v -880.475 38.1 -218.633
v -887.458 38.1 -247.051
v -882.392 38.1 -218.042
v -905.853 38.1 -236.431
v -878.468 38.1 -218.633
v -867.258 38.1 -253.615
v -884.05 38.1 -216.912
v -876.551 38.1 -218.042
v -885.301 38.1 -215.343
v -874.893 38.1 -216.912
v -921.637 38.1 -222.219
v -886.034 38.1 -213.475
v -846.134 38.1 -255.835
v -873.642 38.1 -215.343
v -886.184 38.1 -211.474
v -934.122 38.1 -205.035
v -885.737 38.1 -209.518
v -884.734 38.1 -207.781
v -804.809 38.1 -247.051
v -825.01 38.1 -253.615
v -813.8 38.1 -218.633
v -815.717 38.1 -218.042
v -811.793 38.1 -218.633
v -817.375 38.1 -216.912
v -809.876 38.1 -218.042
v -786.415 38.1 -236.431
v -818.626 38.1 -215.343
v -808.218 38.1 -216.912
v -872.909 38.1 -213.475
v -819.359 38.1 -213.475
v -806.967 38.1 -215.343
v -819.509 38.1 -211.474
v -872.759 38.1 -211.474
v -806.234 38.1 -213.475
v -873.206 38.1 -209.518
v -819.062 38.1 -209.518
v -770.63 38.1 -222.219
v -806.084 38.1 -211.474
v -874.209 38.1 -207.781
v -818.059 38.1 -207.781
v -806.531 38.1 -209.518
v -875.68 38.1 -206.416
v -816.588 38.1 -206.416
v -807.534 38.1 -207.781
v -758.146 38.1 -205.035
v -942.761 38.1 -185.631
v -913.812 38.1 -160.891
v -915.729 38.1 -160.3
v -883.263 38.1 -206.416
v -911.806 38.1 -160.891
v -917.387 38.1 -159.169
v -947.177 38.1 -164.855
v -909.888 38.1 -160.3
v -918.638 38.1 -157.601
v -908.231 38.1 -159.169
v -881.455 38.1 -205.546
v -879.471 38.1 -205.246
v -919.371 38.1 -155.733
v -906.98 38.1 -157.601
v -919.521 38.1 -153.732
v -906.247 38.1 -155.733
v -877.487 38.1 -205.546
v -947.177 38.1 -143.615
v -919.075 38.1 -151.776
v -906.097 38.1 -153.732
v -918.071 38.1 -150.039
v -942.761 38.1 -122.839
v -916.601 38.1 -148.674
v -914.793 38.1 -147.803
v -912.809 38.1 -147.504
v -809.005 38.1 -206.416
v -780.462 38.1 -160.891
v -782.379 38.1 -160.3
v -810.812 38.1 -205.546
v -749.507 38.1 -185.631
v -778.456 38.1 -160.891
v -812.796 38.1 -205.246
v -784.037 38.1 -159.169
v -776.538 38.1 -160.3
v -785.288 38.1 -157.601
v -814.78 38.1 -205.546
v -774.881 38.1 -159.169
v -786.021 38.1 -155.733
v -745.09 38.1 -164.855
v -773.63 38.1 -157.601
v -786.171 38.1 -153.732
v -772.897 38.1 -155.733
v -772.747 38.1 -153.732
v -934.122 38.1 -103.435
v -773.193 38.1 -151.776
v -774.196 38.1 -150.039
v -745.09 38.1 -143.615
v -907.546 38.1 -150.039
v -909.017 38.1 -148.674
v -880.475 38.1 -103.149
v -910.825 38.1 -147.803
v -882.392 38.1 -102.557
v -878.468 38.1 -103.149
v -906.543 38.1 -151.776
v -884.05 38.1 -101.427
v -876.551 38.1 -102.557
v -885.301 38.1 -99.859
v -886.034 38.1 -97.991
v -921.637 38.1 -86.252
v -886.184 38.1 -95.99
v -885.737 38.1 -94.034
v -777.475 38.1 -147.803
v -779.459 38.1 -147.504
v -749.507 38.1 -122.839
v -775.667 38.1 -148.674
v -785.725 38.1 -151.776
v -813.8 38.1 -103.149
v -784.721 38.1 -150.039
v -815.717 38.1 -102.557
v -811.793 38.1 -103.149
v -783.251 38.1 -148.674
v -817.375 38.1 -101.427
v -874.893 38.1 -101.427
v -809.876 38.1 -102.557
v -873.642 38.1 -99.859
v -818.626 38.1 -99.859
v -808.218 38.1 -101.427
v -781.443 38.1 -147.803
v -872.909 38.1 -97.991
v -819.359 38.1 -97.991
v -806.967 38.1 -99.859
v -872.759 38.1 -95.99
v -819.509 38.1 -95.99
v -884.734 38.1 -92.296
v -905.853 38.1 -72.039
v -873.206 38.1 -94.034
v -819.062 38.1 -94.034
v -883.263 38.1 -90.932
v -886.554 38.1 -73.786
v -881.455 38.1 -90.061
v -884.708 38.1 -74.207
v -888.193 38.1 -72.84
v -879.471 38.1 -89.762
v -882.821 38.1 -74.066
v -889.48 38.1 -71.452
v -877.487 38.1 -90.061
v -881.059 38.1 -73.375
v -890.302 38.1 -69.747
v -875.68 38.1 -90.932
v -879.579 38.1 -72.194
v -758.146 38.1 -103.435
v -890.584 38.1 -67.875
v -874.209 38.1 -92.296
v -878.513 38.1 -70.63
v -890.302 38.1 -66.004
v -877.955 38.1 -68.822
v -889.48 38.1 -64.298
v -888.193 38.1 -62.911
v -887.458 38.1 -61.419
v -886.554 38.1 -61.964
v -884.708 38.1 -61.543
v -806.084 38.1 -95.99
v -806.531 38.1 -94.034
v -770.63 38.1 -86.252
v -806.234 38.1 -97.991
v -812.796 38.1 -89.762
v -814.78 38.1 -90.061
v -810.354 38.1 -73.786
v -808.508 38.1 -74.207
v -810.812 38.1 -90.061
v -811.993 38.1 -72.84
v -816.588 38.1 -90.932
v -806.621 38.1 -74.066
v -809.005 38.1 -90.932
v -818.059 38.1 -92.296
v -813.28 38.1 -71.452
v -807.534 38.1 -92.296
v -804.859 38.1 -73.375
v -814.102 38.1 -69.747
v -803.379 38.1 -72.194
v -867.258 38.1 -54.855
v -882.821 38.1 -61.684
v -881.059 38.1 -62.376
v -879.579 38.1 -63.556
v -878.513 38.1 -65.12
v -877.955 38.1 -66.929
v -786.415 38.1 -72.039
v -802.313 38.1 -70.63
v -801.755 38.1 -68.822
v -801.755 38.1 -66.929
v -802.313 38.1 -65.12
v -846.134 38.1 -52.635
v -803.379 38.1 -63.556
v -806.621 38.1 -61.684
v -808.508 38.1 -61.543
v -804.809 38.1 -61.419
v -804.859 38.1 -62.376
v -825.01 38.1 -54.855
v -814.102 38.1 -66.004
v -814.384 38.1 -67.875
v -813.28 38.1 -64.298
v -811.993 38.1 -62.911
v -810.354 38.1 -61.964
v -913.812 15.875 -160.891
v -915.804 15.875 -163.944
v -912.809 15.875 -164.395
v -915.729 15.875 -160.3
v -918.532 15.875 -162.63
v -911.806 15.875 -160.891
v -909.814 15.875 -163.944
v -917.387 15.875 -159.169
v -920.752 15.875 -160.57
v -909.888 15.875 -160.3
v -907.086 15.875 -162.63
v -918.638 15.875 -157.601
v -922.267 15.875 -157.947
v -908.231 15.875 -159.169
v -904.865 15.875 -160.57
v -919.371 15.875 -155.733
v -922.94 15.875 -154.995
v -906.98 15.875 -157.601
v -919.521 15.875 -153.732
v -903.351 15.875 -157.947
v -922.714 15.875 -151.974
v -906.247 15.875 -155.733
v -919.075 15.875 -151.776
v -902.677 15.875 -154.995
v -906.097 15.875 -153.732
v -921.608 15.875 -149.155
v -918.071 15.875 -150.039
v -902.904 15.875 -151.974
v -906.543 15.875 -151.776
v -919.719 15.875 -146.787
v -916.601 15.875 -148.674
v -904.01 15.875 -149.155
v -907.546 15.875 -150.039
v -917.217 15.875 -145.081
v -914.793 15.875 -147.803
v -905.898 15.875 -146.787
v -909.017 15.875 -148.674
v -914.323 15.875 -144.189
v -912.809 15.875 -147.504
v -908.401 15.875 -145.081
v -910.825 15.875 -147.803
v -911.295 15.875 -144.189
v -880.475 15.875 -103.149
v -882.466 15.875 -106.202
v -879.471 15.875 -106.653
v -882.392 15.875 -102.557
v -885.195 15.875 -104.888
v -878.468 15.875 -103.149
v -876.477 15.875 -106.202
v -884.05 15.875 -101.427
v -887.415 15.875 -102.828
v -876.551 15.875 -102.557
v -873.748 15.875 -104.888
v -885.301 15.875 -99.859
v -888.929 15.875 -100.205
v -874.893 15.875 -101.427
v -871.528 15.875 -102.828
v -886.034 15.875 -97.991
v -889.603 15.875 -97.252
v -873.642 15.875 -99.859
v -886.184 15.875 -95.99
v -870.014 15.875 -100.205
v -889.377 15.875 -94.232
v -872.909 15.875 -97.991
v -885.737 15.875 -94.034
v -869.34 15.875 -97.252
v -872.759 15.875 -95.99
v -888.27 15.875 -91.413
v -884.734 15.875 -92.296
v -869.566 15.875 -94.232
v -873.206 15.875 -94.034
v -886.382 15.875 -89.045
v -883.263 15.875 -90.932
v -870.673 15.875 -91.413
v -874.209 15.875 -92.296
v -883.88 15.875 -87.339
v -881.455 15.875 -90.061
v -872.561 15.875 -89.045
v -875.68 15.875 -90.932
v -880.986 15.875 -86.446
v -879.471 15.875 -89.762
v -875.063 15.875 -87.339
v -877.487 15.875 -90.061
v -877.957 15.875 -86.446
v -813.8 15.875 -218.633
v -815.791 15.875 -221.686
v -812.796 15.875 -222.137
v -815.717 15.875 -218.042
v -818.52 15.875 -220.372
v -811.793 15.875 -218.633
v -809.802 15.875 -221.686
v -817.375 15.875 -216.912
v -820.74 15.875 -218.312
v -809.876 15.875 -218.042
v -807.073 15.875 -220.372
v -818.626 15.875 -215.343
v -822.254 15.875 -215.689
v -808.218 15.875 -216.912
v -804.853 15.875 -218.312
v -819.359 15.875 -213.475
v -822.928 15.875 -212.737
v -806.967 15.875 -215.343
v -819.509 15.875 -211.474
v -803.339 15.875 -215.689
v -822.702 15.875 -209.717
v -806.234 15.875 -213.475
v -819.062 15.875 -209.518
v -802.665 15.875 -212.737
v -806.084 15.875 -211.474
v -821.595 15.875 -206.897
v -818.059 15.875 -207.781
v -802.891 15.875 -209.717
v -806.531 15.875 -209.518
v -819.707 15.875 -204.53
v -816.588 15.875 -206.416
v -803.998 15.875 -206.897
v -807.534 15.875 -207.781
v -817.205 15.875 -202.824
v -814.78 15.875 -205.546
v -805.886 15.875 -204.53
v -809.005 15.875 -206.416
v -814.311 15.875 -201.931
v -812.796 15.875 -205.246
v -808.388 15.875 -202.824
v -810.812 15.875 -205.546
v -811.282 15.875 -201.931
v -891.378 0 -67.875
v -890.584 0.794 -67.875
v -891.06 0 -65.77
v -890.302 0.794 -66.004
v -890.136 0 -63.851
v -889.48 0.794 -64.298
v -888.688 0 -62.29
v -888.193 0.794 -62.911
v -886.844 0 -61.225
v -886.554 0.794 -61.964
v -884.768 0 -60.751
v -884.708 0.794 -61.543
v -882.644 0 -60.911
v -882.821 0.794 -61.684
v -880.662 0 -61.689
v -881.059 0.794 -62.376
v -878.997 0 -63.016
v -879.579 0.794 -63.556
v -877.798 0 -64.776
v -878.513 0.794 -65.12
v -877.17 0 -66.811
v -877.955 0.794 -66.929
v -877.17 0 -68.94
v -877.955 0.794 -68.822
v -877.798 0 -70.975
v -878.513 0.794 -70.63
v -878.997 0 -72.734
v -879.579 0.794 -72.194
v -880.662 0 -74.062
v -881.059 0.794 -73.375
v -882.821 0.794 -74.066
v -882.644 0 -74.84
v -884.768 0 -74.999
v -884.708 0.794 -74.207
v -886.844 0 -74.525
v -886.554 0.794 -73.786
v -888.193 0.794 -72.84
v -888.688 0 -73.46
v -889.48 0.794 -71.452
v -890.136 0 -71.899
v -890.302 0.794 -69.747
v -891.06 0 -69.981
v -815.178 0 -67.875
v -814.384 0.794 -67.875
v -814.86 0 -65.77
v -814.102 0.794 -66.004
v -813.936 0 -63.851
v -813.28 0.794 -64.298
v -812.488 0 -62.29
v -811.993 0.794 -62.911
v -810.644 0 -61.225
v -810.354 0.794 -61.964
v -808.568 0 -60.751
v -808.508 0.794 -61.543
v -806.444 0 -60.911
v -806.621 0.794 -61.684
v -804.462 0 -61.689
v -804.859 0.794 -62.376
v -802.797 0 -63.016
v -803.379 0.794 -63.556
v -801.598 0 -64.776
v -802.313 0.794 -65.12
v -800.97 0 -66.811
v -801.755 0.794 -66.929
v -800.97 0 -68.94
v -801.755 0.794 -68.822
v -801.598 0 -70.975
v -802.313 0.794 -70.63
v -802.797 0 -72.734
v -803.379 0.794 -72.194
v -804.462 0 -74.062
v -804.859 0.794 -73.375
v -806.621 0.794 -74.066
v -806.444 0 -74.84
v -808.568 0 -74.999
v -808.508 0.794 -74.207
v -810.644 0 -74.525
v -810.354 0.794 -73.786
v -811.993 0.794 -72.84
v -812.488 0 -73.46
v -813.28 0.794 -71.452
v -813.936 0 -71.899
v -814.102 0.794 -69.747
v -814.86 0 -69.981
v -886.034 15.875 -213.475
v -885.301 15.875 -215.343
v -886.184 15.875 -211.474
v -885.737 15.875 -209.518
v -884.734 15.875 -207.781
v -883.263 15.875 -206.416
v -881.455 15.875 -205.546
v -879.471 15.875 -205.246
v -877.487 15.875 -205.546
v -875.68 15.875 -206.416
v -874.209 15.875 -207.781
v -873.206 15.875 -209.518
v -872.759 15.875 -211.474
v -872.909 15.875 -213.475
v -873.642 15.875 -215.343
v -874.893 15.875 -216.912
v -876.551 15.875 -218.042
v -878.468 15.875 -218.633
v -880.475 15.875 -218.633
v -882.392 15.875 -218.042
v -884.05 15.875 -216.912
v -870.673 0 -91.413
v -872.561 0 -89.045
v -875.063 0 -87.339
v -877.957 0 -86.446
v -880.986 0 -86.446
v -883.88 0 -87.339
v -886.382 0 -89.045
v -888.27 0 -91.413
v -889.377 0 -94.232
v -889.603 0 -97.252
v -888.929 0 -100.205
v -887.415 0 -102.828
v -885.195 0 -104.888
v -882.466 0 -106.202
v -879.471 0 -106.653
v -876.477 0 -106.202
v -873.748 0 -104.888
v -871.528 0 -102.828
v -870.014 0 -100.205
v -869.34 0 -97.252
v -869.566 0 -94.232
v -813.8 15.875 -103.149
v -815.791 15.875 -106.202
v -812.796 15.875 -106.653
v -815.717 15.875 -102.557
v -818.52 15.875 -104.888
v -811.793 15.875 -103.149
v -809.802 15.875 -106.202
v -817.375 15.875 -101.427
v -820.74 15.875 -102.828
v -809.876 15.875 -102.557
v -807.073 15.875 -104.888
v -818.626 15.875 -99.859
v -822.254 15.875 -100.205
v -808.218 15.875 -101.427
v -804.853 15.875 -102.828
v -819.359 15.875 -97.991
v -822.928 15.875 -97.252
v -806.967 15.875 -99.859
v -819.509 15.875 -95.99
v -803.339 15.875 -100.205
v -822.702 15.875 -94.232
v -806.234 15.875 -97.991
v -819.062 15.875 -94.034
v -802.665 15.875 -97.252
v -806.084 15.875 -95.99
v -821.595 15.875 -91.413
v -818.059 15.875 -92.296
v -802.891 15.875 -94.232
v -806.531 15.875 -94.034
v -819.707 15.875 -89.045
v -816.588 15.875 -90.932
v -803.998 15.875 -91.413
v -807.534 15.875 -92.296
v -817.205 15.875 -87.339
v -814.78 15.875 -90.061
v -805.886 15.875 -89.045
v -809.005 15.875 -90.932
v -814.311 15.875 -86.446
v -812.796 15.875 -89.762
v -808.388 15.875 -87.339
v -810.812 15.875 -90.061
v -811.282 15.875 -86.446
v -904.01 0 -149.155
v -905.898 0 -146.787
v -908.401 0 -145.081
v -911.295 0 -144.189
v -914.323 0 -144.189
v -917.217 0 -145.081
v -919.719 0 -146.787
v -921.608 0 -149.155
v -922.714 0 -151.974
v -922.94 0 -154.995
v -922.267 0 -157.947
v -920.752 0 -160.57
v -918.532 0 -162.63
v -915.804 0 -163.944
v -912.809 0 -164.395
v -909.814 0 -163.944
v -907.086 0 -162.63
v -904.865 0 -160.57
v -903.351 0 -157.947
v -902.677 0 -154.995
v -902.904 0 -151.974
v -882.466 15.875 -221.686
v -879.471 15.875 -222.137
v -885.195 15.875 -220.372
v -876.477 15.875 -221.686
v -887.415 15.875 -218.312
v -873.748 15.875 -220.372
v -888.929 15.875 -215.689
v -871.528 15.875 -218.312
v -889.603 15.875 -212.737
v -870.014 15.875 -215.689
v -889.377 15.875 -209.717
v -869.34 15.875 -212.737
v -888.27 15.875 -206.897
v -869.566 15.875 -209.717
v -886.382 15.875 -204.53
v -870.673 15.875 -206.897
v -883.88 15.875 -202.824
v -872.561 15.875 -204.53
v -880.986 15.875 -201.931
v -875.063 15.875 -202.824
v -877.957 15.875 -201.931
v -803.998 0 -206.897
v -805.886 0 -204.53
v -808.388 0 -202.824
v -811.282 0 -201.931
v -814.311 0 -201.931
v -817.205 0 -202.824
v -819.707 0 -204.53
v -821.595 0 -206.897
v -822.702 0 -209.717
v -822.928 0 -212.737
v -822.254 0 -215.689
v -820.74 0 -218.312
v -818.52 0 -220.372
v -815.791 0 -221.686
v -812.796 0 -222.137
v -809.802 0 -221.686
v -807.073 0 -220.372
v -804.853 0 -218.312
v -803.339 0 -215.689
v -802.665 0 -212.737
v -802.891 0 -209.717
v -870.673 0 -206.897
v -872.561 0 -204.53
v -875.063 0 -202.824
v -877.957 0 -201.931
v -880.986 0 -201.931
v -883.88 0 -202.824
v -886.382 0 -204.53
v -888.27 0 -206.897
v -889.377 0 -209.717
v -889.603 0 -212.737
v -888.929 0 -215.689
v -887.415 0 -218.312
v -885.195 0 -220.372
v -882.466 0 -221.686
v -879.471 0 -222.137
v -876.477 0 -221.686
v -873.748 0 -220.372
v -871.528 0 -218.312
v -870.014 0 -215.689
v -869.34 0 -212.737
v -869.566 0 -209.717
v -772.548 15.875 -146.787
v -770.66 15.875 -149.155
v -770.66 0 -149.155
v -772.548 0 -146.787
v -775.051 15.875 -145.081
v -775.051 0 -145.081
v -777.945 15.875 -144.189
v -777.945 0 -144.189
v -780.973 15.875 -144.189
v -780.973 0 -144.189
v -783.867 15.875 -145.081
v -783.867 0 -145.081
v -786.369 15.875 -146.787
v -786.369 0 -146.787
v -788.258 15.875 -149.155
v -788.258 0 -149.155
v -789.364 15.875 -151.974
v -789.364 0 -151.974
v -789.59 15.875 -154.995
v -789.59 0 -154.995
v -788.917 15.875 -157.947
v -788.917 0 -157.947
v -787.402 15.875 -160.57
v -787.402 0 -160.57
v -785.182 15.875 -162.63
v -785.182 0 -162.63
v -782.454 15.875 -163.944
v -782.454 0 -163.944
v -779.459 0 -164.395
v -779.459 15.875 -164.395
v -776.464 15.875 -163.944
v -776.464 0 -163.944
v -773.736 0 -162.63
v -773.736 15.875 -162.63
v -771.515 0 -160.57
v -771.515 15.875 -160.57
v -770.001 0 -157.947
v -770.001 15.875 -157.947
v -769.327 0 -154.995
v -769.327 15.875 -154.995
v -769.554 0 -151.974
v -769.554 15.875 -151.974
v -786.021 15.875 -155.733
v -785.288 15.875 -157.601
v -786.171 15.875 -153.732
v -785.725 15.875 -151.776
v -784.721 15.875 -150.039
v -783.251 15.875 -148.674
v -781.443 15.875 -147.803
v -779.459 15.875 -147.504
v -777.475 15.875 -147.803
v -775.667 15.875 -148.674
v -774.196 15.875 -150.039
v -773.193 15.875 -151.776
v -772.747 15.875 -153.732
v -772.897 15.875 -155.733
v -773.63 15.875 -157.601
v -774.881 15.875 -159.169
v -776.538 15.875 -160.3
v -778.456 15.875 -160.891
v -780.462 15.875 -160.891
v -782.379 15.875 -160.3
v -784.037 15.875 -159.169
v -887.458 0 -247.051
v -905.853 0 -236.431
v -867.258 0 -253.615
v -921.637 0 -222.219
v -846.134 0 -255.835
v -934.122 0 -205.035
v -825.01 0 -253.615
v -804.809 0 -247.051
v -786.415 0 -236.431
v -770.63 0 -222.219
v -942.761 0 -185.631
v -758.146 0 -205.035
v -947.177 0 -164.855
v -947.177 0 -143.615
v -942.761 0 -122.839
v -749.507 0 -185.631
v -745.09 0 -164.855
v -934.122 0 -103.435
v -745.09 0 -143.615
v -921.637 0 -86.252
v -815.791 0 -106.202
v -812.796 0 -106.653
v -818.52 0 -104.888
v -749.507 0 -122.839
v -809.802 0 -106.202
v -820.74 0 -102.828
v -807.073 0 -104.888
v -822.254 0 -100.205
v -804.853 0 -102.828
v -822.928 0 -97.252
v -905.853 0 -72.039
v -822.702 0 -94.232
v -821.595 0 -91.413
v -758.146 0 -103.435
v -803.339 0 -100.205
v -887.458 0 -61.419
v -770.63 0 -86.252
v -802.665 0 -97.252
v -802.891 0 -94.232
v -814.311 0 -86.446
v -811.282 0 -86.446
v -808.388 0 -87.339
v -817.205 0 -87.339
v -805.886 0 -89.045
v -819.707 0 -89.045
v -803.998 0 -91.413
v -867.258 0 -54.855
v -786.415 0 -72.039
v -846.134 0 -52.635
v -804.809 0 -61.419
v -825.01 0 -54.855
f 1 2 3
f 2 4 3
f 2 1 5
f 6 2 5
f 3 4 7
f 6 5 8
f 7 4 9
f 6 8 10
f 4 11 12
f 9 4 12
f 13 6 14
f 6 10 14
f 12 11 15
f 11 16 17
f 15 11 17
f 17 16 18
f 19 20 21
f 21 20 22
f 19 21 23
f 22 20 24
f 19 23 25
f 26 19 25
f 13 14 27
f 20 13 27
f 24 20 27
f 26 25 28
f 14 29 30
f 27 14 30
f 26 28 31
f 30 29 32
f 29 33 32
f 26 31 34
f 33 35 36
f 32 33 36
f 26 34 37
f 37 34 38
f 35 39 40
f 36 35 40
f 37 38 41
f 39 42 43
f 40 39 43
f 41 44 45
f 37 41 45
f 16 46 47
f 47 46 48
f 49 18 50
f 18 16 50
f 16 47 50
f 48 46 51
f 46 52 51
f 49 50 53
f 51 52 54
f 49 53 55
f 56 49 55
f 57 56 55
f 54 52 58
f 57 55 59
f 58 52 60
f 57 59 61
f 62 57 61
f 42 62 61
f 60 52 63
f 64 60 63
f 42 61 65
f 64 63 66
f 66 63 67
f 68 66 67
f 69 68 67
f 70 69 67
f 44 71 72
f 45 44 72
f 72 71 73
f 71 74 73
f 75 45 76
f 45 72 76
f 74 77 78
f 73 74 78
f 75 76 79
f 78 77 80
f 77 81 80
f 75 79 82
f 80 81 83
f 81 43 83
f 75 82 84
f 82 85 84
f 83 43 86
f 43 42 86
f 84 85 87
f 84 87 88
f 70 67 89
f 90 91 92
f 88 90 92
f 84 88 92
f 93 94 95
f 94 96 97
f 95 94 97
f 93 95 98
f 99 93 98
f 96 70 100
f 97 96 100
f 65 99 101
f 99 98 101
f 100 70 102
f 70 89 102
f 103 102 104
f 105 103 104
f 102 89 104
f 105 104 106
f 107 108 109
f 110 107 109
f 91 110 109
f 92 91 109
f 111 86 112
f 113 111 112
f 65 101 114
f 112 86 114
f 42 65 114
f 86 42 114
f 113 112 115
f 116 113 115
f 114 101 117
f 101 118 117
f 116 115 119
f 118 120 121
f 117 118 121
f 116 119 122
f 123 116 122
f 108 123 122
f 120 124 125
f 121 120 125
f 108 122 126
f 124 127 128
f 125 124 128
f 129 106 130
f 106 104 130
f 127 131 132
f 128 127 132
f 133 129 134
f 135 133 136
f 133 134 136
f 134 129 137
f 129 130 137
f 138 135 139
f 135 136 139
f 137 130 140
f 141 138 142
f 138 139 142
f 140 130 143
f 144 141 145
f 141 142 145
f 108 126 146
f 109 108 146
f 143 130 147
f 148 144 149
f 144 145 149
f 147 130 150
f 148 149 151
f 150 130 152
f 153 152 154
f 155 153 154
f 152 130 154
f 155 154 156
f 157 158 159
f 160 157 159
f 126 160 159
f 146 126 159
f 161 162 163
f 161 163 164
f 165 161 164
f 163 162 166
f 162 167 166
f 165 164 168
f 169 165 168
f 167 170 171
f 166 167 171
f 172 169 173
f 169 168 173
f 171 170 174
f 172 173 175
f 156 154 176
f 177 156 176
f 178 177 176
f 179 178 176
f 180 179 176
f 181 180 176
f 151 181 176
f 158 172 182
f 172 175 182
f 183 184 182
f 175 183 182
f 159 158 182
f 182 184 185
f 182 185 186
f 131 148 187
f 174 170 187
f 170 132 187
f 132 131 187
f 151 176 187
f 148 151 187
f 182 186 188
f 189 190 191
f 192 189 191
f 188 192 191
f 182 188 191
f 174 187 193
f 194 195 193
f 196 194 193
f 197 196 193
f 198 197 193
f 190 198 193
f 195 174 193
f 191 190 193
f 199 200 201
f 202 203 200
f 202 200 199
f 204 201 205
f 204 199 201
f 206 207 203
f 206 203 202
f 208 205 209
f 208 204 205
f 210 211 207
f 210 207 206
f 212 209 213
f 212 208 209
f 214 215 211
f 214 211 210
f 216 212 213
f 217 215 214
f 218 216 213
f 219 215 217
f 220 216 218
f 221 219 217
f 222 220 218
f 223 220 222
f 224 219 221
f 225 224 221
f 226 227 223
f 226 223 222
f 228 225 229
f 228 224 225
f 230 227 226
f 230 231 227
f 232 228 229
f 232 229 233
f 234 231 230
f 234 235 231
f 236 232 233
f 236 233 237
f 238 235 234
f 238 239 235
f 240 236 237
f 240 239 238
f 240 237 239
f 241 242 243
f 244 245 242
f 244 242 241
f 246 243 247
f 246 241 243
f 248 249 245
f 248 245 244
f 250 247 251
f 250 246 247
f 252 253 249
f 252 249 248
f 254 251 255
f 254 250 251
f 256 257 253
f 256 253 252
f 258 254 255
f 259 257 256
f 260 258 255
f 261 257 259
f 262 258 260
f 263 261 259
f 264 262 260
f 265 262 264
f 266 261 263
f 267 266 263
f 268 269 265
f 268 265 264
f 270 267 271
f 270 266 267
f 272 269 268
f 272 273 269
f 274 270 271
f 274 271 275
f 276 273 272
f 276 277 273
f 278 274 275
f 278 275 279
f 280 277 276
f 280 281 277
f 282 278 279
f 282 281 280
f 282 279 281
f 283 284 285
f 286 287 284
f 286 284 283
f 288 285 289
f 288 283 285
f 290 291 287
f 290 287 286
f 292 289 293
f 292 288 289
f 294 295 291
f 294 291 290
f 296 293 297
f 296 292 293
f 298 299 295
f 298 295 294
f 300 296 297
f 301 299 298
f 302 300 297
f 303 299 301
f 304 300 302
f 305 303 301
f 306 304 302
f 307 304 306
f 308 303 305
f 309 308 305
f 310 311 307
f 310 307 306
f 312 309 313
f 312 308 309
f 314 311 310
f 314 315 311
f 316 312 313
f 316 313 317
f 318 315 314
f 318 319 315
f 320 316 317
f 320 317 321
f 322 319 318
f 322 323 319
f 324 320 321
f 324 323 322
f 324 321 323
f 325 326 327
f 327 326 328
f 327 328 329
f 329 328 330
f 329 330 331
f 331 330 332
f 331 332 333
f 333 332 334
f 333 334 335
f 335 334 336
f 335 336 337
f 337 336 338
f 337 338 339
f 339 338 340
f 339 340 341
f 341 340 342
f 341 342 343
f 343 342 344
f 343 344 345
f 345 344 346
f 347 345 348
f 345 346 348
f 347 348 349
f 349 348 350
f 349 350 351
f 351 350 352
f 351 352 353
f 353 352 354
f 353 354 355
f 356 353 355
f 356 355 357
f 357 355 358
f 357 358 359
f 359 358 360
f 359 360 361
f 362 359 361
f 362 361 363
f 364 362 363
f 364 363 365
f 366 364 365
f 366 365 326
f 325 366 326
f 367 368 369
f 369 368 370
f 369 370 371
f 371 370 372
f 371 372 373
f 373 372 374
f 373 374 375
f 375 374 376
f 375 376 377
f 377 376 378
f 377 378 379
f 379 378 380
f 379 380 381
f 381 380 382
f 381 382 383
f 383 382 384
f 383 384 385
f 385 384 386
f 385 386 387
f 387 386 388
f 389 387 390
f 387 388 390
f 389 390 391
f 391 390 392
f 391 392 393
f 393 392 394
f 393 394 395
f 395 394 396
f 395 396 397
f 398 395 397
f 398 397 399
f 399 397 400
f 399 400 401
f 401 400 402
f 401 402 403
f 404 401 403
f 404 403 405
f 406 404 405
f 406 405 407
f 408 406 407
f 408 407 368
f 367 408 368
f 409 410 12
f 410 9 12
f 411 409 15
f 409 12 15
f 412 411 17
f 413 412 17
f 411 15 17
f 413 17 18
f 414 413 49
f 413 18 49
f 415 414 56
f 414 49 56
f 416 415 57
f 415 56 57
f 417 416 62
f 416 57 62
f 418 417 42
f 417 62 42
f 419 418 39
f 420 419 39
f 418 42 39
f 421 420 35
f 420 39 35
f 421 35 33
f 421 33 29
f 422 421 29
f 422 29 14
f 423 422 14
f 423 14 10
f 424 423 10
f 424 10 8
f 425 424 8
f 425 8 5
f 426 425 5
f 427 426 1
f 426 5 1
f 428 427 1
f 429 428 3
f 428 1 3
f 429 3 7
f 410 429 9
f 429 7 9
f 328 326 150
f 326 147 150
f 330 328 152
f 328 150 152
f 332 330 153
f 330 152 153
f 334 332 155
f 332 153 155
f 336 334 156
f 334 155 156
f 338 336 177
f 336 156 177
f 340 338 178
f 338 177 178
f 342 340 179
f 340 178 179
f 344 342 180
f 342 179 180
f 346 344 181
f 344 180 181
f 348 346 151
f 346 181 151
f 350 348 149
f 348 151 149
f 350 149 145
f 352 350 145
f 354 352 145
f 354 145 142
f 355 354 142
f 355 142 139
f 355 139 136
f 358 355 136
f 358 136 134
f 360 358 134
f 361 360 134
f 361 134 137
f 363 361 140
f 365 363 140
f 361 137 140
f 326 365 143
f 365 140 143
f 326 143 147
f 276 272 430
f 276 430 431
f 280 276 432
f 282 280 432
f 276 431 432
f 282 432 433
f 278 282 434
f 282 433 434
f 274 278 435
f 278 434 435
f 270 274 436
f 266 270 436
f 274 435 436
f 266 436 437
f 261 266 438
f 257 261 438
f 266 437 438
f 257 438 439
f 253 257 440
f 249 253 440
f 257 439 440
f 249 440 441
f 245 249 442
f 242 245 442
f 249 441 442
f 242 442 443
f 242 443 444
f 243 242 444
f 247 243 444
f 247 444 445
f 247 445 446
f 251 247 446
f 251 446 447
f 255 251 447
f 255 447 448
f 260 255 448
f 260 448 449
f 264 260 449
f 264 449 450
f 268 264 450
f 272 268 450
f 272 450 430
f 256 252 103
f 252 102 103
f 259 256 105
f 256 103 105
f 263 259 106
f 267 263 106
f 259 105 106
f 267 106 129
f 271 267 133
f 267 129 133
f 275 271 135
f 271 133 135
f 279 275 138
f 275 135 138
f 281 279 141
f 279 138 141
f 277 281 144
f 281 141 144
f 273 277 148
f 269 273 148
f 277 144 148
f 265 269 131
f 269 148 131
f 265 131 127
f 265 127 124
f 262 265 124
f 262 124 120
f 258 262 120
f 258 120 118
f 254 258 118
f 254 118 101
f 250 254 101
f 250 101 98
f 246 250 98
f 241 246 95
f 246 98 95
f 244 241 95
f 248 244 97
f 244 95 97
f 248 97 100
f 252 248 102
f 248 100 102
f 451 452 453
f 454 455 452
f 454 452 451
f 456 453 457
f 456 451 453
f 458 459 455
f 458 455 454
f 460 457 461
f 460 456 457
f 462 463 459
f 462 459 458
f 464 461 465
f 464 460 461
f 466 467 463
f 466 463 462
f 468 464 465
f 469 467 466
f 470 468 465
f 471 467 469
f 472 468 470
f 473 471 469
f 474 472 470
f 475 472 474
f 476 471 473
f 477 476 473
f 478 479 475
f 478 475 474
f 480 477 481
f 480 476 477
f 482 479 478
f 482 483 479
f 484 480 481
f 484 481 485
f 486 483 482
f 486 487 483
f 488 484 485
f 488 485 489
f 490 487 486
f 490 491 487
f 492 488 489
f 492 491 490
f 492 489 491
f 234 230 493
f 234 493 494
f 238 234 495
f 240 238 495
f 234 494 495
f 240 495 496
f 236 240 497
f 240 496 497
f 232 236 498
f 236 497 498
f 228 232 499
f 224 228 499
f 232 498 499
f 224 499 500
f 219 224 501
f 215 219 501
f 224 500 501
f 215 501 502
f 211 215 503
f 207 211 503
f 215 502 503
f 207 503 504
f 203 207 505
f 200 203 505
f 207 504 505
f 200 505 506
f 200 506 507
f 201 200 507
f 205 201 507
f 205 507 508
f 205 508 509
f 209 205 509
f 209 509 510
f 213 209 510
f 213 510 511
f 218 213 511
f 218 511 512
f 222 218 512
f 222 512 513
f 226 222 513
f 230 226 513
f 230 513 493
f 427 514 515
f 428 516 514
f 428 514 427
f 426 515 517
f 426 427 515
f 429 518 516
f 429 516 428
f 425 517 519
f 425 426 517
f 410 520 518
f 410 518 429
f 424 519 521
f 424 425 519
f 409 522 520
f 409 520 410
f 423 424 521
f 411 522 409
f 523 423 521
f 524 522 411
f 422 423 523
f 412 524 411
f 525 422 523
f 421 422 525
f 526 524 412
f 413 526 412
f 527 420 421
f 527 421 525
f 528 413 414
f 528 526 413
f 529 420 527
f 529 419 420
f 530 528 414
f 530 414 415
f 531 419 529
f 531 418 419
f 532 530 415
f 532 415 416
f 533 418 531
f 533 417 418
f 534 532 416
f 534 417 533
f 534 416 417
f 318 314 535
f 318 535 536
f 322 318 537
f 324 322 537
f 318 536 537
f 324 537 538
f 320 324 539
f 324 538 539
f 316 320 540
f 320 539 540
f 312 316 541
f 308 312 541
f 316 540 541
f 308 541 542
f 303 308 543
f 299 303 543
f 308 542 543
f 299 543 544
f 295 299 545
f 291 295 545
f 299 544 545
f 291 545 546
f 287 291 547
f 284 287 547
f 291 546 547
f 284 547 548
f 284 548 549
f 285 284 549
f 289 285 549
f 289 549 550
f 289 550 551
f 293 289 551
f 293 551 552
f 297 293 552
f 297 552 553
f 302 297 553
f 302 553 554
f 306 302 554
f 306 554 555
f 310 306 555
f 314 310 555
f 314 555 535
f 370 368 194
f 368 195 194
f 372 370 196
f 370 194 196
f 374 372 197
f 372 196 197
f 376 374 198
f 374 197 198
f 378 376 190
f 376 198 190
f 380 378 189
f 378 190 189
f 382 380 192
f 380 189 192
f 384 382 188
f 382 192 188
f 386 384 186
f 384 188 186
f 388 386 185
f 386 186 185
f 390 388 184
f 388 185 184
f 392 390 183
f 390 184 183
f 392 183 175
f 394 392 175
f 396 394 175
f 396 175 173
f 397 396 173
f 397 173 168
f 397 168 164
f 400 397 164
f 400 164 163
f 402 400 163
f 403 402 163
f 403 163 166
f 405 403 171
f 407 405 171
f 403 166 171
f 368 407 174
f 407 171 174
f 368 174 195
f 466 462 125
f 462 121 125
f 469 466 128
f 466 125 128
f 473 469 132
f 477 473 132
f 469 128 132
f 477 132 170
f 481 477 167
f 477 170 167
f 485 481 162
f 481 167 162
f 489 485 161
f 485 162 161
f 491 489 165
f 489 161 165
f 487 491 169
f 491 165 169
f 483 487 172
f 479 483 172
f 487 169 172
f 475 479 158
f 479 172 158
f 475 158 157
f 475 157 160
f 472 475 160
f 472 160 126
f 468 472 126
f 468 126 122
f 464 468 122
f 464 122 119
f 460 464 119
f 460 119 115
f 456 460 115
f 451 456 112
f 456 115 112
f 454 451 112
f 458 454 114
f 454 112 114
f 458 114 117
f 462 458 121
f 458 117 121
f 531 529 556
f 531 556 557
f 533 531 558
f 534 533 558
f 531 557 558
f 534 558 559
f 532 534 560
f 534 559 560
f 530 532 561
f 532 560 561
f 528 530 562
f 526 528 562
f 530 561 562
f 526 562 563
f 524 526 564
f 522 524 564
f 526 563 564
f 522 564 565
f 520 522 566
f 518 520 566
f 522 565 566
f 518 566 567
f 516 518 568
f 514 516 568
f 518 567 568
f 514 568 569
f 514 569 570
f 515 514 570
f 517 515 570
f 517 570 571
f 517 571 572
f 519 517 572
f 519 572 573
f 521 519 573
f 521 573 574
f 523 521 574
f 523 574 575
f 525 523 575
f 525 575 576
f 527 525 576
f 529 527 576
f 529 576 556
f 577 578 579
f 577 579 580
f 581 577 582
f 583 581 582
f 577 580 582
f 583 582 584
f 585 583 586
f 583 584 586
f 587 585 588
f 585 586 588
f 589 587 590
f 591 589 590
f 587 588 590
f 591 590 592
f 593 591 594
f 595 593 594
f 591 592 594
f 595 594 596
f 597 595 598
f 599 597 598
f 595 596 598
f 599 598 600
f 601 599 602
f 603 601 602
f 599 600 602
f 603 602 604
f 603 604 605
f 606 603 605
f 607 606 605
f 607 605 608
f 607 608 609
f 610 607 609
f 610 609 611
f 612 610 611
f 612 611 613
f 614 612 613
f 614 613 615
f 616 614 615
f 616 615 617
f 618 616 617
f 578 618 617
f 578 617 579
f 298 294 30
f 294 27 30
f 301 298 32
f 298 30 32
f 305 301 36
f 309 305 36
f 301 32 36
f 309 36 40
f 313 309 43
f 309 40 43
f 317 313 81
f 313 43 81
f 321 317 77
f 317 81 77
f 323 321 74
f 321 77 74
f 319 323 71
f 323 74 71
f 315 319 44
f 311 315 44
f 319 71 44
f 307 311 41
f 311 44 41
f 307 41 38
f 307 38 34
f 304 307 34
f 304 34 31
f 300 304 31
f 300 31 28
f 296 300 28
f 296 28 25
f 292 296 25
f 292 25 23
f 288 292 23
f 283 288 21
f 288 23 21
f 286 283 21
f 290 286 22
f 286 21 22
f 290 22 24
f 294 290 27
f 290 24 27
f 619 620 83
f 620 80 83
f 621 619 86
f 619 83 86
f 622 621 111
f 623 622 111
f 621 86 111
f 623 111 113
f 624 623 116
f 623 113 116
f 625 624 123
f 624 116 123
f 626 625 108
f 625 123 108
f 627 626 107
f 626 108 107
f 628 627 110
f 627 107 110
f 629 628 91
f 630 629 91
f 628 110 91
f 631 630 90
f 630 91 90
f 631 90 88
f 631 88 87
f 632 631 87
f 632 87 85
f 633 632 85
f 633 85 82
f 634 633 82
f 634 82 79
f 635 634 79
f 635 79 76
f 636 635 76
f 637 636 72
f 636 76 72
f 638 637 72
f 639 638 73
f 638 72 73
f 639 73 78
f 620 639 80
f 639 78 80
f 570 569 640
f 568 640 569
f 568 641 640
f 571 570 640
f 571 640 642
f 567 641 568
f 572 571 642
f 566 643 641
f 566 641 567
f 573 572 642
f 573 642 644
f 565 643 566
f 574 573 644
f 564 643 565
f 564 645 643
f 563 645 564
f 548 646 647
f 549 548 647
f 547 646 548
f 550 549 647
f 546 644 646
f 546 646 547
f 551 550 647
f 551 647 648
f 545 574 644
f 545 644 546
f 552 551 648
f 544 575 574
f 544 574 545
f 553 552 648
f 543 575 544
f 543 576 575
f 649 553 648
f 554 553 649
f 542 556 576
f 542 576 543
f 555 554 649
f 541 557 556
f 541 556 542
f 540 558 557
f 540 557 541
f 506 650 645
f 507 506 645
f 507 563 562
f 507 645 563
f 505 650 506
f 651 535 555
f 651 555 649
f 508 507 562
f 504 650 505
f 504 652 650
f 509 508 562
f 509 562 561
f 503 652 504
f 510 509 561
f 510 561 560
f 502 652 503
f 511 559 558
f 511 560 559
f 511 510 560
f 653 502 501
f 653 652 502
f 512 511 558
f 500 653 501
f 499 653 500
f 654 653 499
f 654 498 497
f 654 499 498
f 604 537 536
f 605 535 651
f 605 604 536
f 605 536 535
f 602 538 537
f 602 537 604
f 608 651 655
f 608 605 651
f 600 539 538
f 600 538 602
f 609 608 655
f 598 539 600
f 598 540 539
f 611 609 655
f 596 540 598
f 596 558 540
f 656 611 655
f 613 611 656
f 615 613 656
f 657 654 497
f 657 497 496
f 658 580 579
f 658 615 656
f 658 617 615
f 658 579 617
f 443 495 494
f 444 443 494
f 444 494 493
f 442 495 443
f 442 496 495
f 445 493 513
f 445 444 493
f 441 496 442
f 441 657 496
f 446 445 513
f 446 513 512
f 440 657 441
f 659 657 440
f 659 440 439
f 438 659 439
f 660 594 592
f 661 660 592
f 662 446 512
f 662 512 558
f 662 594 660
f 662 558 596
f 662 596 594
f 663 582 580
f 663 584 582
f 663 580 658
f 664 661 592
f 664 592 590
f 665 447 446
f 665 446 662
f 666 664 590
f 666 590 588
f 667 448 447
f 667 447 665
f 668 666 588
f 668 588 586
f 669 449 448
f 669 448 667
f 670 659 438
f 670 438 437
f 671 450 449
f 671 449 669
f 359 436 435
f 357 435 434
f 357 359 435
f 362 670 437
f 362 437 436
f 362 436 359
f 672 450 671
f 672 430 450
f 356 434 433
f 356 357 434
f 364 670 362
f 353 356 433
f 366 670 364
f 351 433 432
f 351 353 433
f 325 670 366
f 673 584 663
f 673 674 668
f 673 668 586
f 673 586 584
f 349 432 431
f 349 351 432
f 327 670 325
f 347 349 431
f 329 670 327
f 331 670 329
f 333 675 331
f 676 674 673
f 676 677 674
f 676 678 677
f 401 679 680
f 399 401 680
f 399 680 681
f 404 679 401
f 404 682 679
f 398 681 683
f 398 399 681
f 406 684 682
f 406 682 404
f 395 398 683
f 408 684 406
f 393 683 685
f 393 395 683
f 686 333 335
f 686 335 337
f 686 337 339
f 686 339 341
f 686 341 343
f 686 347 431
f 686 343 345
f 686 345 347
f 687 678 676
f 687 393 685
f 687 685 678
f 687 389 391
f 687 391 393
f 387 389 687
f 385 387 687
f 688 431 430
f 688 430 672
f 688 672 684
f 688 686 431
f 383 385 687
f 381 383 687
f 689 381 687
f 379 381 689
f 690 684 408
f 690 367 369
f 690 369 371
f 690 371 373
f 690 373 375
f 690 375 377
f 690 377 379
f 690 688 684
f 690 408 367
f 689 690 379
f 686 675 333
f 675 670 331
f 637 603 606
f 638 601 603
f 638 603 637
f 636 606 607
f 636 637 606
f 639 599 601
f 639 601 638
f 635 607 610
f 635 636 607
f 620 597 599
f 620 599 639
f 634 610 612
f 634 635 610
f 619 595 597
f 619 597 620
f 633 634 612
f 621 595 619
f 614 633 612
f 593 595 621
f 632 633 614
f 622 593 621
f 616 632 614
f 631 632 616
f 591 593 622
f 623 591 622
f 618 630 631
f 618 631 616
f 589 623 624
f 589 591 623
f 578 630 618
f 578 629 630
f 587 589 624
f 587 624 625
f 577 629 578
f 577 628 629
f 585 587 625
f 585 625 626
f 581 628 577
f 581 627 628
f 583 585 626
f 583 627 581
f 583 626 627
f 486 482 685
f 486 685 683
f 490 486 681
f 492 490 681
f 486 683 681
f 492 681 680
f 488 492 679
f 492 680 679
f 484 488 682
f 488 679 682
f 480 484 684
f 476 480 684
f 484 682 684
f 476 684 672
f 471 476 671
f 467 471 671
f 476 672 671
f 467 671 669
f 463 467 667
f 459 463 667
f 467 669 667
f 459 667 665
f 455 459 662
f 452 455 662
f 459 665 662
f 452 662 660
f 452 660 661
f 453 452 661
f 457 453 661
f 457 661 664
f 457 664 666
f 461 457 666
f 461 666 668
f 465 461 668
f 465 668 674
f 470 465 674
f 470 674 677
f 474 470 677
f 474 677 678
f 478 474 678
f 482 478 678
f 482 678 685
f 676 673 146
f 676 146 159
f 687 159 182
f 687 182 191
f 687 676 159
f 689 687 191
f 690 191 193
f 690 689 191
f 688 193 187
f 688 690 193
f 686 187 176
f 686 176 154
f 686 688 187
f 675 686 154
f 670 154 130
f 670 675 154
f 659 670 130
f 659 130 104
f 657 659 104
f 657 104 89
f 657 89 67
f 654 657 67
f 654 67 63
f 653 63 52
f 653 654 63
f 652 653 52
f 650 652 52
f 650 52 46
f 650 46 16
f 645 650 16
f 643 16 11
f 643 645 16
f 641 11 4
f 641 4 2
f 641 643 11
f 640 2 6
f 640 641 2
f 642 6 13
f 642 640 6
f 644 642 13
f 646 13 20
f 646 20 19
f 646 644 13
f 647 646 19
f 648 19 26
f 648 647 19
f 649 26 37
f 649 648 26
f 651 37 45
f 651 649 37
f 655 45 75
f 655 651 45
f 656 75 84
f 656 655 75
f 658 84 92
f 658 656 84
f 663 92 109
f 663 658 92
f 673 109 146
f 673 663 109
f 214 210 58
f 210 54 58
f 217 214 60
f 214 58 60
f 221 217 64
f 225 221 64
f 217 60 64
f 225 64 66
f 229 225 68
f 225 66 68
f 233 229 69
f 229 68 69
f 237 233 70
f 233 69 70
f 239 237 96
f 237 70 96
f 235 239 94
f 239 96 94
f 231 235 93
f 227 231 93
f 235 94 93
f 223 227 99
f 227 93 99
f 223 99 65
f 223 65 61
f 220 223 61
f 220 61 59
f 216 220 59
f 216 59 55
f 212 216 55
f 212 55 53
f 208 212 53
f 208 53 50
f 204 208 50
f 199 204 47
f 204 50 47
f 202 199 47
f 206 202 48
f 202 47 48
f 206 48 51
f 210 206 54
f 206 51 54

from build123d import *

# Parameters (mm, degrees)
F0_R           = 101.6
F1_DEPTH       = 38.1
F2_D           = 13.462
F2_DEPTH       = 50.8
F2_CBORE_D     = 20.32
F2_CBORE_DEPTH = 15.875
F2_TIP         = 4.0443928267
F3_D           = 13.462
F3_DEPTH       = 50.8
F3_CBORE_D     = 20.32
F3_CBORE_DEPTH = 15.875
F3_TIP         = 4.0443928267
F4_ANGLE       = 30
F6_D           = 12.7
F6_DEPTH       = 50.8
F6_CSINK_D     = 14.2875
F6_CSINK_ANGLE = 90
F6_TIP         = 3.8154649308


# Not quite as in the source:
# - a feature names something its author has since deleted; it is built from what else it names


with BuildPart() as f1:
    # F0 (on Front) → F1 (new body)
    with BuildSketch(Plane.XZ):
        Circle(F0_R)
    extrude(amount=-F1_DEPTH)

    # F2
    with Locations(Plane.XZ):
        with Locations((0, 66.675)):
            CounterBoreHole(F2_D / 2, F2_CBORE_D / 2, F2_CBORE_DEPTH, depth=F2_DEPTH)
            with Locations((0, 0, -(F2_DEPTH + F2_TIP / 2))):  # 118° drill point
                Cone(0, F2_D / 2, F2_TIP, mode=Mode.SUBTRACT)

    # F3
    with Locations(Plane.XZ):
        with Locations((-57.7422437973, 33.3375), (-57.7422437973, -33.3375), (0, -66.675), (57.7422437973, -33.3375), (57.7422437973, 33.3375)):
            CounterBoreHole(F3_D / 2, F3_CBORE_D / 2, F3_CBORE_DEPTH, depth=F3_DEPTH)
            with Locations((0, 0, -(F3_DEPTH + F3_TIP / 2))):  # 118° drill point
                Cone(0, F3_D / 2, F3_TIP, mode=Mode.SUBTRACT)


with BuildPart() as f1_1:
    # F4: moved
    add(f1.part.rotate(Axis((0, 0, 0), (0, -1, 0)), F4_ANGLE))


with BuildPart() as f1_2:
    # F5: moved
    add(f1_1.part.moved(Location((-846.1338678, 0, -154.2352516))))

    # F6
    with Locations(Plane.XZ):
        with Locations((-884.2338678, -67.8752516), (-808.0338678, -67.8752516)):
            CounterSinkHole(F6_D / 2, F6_CSINK_D / 2, depth=F6_DEPTH, counter_sink_angle=F6_CSINK_ANGLE)
            with Locations((0, 0, -(F6_DEPTH + F6_TIP / 2))):  # 118° drill point
                Cone(0, F6_D / 2, F6_TIP, mode=Mode.SUBTRACT)


solid = f1_2.part
